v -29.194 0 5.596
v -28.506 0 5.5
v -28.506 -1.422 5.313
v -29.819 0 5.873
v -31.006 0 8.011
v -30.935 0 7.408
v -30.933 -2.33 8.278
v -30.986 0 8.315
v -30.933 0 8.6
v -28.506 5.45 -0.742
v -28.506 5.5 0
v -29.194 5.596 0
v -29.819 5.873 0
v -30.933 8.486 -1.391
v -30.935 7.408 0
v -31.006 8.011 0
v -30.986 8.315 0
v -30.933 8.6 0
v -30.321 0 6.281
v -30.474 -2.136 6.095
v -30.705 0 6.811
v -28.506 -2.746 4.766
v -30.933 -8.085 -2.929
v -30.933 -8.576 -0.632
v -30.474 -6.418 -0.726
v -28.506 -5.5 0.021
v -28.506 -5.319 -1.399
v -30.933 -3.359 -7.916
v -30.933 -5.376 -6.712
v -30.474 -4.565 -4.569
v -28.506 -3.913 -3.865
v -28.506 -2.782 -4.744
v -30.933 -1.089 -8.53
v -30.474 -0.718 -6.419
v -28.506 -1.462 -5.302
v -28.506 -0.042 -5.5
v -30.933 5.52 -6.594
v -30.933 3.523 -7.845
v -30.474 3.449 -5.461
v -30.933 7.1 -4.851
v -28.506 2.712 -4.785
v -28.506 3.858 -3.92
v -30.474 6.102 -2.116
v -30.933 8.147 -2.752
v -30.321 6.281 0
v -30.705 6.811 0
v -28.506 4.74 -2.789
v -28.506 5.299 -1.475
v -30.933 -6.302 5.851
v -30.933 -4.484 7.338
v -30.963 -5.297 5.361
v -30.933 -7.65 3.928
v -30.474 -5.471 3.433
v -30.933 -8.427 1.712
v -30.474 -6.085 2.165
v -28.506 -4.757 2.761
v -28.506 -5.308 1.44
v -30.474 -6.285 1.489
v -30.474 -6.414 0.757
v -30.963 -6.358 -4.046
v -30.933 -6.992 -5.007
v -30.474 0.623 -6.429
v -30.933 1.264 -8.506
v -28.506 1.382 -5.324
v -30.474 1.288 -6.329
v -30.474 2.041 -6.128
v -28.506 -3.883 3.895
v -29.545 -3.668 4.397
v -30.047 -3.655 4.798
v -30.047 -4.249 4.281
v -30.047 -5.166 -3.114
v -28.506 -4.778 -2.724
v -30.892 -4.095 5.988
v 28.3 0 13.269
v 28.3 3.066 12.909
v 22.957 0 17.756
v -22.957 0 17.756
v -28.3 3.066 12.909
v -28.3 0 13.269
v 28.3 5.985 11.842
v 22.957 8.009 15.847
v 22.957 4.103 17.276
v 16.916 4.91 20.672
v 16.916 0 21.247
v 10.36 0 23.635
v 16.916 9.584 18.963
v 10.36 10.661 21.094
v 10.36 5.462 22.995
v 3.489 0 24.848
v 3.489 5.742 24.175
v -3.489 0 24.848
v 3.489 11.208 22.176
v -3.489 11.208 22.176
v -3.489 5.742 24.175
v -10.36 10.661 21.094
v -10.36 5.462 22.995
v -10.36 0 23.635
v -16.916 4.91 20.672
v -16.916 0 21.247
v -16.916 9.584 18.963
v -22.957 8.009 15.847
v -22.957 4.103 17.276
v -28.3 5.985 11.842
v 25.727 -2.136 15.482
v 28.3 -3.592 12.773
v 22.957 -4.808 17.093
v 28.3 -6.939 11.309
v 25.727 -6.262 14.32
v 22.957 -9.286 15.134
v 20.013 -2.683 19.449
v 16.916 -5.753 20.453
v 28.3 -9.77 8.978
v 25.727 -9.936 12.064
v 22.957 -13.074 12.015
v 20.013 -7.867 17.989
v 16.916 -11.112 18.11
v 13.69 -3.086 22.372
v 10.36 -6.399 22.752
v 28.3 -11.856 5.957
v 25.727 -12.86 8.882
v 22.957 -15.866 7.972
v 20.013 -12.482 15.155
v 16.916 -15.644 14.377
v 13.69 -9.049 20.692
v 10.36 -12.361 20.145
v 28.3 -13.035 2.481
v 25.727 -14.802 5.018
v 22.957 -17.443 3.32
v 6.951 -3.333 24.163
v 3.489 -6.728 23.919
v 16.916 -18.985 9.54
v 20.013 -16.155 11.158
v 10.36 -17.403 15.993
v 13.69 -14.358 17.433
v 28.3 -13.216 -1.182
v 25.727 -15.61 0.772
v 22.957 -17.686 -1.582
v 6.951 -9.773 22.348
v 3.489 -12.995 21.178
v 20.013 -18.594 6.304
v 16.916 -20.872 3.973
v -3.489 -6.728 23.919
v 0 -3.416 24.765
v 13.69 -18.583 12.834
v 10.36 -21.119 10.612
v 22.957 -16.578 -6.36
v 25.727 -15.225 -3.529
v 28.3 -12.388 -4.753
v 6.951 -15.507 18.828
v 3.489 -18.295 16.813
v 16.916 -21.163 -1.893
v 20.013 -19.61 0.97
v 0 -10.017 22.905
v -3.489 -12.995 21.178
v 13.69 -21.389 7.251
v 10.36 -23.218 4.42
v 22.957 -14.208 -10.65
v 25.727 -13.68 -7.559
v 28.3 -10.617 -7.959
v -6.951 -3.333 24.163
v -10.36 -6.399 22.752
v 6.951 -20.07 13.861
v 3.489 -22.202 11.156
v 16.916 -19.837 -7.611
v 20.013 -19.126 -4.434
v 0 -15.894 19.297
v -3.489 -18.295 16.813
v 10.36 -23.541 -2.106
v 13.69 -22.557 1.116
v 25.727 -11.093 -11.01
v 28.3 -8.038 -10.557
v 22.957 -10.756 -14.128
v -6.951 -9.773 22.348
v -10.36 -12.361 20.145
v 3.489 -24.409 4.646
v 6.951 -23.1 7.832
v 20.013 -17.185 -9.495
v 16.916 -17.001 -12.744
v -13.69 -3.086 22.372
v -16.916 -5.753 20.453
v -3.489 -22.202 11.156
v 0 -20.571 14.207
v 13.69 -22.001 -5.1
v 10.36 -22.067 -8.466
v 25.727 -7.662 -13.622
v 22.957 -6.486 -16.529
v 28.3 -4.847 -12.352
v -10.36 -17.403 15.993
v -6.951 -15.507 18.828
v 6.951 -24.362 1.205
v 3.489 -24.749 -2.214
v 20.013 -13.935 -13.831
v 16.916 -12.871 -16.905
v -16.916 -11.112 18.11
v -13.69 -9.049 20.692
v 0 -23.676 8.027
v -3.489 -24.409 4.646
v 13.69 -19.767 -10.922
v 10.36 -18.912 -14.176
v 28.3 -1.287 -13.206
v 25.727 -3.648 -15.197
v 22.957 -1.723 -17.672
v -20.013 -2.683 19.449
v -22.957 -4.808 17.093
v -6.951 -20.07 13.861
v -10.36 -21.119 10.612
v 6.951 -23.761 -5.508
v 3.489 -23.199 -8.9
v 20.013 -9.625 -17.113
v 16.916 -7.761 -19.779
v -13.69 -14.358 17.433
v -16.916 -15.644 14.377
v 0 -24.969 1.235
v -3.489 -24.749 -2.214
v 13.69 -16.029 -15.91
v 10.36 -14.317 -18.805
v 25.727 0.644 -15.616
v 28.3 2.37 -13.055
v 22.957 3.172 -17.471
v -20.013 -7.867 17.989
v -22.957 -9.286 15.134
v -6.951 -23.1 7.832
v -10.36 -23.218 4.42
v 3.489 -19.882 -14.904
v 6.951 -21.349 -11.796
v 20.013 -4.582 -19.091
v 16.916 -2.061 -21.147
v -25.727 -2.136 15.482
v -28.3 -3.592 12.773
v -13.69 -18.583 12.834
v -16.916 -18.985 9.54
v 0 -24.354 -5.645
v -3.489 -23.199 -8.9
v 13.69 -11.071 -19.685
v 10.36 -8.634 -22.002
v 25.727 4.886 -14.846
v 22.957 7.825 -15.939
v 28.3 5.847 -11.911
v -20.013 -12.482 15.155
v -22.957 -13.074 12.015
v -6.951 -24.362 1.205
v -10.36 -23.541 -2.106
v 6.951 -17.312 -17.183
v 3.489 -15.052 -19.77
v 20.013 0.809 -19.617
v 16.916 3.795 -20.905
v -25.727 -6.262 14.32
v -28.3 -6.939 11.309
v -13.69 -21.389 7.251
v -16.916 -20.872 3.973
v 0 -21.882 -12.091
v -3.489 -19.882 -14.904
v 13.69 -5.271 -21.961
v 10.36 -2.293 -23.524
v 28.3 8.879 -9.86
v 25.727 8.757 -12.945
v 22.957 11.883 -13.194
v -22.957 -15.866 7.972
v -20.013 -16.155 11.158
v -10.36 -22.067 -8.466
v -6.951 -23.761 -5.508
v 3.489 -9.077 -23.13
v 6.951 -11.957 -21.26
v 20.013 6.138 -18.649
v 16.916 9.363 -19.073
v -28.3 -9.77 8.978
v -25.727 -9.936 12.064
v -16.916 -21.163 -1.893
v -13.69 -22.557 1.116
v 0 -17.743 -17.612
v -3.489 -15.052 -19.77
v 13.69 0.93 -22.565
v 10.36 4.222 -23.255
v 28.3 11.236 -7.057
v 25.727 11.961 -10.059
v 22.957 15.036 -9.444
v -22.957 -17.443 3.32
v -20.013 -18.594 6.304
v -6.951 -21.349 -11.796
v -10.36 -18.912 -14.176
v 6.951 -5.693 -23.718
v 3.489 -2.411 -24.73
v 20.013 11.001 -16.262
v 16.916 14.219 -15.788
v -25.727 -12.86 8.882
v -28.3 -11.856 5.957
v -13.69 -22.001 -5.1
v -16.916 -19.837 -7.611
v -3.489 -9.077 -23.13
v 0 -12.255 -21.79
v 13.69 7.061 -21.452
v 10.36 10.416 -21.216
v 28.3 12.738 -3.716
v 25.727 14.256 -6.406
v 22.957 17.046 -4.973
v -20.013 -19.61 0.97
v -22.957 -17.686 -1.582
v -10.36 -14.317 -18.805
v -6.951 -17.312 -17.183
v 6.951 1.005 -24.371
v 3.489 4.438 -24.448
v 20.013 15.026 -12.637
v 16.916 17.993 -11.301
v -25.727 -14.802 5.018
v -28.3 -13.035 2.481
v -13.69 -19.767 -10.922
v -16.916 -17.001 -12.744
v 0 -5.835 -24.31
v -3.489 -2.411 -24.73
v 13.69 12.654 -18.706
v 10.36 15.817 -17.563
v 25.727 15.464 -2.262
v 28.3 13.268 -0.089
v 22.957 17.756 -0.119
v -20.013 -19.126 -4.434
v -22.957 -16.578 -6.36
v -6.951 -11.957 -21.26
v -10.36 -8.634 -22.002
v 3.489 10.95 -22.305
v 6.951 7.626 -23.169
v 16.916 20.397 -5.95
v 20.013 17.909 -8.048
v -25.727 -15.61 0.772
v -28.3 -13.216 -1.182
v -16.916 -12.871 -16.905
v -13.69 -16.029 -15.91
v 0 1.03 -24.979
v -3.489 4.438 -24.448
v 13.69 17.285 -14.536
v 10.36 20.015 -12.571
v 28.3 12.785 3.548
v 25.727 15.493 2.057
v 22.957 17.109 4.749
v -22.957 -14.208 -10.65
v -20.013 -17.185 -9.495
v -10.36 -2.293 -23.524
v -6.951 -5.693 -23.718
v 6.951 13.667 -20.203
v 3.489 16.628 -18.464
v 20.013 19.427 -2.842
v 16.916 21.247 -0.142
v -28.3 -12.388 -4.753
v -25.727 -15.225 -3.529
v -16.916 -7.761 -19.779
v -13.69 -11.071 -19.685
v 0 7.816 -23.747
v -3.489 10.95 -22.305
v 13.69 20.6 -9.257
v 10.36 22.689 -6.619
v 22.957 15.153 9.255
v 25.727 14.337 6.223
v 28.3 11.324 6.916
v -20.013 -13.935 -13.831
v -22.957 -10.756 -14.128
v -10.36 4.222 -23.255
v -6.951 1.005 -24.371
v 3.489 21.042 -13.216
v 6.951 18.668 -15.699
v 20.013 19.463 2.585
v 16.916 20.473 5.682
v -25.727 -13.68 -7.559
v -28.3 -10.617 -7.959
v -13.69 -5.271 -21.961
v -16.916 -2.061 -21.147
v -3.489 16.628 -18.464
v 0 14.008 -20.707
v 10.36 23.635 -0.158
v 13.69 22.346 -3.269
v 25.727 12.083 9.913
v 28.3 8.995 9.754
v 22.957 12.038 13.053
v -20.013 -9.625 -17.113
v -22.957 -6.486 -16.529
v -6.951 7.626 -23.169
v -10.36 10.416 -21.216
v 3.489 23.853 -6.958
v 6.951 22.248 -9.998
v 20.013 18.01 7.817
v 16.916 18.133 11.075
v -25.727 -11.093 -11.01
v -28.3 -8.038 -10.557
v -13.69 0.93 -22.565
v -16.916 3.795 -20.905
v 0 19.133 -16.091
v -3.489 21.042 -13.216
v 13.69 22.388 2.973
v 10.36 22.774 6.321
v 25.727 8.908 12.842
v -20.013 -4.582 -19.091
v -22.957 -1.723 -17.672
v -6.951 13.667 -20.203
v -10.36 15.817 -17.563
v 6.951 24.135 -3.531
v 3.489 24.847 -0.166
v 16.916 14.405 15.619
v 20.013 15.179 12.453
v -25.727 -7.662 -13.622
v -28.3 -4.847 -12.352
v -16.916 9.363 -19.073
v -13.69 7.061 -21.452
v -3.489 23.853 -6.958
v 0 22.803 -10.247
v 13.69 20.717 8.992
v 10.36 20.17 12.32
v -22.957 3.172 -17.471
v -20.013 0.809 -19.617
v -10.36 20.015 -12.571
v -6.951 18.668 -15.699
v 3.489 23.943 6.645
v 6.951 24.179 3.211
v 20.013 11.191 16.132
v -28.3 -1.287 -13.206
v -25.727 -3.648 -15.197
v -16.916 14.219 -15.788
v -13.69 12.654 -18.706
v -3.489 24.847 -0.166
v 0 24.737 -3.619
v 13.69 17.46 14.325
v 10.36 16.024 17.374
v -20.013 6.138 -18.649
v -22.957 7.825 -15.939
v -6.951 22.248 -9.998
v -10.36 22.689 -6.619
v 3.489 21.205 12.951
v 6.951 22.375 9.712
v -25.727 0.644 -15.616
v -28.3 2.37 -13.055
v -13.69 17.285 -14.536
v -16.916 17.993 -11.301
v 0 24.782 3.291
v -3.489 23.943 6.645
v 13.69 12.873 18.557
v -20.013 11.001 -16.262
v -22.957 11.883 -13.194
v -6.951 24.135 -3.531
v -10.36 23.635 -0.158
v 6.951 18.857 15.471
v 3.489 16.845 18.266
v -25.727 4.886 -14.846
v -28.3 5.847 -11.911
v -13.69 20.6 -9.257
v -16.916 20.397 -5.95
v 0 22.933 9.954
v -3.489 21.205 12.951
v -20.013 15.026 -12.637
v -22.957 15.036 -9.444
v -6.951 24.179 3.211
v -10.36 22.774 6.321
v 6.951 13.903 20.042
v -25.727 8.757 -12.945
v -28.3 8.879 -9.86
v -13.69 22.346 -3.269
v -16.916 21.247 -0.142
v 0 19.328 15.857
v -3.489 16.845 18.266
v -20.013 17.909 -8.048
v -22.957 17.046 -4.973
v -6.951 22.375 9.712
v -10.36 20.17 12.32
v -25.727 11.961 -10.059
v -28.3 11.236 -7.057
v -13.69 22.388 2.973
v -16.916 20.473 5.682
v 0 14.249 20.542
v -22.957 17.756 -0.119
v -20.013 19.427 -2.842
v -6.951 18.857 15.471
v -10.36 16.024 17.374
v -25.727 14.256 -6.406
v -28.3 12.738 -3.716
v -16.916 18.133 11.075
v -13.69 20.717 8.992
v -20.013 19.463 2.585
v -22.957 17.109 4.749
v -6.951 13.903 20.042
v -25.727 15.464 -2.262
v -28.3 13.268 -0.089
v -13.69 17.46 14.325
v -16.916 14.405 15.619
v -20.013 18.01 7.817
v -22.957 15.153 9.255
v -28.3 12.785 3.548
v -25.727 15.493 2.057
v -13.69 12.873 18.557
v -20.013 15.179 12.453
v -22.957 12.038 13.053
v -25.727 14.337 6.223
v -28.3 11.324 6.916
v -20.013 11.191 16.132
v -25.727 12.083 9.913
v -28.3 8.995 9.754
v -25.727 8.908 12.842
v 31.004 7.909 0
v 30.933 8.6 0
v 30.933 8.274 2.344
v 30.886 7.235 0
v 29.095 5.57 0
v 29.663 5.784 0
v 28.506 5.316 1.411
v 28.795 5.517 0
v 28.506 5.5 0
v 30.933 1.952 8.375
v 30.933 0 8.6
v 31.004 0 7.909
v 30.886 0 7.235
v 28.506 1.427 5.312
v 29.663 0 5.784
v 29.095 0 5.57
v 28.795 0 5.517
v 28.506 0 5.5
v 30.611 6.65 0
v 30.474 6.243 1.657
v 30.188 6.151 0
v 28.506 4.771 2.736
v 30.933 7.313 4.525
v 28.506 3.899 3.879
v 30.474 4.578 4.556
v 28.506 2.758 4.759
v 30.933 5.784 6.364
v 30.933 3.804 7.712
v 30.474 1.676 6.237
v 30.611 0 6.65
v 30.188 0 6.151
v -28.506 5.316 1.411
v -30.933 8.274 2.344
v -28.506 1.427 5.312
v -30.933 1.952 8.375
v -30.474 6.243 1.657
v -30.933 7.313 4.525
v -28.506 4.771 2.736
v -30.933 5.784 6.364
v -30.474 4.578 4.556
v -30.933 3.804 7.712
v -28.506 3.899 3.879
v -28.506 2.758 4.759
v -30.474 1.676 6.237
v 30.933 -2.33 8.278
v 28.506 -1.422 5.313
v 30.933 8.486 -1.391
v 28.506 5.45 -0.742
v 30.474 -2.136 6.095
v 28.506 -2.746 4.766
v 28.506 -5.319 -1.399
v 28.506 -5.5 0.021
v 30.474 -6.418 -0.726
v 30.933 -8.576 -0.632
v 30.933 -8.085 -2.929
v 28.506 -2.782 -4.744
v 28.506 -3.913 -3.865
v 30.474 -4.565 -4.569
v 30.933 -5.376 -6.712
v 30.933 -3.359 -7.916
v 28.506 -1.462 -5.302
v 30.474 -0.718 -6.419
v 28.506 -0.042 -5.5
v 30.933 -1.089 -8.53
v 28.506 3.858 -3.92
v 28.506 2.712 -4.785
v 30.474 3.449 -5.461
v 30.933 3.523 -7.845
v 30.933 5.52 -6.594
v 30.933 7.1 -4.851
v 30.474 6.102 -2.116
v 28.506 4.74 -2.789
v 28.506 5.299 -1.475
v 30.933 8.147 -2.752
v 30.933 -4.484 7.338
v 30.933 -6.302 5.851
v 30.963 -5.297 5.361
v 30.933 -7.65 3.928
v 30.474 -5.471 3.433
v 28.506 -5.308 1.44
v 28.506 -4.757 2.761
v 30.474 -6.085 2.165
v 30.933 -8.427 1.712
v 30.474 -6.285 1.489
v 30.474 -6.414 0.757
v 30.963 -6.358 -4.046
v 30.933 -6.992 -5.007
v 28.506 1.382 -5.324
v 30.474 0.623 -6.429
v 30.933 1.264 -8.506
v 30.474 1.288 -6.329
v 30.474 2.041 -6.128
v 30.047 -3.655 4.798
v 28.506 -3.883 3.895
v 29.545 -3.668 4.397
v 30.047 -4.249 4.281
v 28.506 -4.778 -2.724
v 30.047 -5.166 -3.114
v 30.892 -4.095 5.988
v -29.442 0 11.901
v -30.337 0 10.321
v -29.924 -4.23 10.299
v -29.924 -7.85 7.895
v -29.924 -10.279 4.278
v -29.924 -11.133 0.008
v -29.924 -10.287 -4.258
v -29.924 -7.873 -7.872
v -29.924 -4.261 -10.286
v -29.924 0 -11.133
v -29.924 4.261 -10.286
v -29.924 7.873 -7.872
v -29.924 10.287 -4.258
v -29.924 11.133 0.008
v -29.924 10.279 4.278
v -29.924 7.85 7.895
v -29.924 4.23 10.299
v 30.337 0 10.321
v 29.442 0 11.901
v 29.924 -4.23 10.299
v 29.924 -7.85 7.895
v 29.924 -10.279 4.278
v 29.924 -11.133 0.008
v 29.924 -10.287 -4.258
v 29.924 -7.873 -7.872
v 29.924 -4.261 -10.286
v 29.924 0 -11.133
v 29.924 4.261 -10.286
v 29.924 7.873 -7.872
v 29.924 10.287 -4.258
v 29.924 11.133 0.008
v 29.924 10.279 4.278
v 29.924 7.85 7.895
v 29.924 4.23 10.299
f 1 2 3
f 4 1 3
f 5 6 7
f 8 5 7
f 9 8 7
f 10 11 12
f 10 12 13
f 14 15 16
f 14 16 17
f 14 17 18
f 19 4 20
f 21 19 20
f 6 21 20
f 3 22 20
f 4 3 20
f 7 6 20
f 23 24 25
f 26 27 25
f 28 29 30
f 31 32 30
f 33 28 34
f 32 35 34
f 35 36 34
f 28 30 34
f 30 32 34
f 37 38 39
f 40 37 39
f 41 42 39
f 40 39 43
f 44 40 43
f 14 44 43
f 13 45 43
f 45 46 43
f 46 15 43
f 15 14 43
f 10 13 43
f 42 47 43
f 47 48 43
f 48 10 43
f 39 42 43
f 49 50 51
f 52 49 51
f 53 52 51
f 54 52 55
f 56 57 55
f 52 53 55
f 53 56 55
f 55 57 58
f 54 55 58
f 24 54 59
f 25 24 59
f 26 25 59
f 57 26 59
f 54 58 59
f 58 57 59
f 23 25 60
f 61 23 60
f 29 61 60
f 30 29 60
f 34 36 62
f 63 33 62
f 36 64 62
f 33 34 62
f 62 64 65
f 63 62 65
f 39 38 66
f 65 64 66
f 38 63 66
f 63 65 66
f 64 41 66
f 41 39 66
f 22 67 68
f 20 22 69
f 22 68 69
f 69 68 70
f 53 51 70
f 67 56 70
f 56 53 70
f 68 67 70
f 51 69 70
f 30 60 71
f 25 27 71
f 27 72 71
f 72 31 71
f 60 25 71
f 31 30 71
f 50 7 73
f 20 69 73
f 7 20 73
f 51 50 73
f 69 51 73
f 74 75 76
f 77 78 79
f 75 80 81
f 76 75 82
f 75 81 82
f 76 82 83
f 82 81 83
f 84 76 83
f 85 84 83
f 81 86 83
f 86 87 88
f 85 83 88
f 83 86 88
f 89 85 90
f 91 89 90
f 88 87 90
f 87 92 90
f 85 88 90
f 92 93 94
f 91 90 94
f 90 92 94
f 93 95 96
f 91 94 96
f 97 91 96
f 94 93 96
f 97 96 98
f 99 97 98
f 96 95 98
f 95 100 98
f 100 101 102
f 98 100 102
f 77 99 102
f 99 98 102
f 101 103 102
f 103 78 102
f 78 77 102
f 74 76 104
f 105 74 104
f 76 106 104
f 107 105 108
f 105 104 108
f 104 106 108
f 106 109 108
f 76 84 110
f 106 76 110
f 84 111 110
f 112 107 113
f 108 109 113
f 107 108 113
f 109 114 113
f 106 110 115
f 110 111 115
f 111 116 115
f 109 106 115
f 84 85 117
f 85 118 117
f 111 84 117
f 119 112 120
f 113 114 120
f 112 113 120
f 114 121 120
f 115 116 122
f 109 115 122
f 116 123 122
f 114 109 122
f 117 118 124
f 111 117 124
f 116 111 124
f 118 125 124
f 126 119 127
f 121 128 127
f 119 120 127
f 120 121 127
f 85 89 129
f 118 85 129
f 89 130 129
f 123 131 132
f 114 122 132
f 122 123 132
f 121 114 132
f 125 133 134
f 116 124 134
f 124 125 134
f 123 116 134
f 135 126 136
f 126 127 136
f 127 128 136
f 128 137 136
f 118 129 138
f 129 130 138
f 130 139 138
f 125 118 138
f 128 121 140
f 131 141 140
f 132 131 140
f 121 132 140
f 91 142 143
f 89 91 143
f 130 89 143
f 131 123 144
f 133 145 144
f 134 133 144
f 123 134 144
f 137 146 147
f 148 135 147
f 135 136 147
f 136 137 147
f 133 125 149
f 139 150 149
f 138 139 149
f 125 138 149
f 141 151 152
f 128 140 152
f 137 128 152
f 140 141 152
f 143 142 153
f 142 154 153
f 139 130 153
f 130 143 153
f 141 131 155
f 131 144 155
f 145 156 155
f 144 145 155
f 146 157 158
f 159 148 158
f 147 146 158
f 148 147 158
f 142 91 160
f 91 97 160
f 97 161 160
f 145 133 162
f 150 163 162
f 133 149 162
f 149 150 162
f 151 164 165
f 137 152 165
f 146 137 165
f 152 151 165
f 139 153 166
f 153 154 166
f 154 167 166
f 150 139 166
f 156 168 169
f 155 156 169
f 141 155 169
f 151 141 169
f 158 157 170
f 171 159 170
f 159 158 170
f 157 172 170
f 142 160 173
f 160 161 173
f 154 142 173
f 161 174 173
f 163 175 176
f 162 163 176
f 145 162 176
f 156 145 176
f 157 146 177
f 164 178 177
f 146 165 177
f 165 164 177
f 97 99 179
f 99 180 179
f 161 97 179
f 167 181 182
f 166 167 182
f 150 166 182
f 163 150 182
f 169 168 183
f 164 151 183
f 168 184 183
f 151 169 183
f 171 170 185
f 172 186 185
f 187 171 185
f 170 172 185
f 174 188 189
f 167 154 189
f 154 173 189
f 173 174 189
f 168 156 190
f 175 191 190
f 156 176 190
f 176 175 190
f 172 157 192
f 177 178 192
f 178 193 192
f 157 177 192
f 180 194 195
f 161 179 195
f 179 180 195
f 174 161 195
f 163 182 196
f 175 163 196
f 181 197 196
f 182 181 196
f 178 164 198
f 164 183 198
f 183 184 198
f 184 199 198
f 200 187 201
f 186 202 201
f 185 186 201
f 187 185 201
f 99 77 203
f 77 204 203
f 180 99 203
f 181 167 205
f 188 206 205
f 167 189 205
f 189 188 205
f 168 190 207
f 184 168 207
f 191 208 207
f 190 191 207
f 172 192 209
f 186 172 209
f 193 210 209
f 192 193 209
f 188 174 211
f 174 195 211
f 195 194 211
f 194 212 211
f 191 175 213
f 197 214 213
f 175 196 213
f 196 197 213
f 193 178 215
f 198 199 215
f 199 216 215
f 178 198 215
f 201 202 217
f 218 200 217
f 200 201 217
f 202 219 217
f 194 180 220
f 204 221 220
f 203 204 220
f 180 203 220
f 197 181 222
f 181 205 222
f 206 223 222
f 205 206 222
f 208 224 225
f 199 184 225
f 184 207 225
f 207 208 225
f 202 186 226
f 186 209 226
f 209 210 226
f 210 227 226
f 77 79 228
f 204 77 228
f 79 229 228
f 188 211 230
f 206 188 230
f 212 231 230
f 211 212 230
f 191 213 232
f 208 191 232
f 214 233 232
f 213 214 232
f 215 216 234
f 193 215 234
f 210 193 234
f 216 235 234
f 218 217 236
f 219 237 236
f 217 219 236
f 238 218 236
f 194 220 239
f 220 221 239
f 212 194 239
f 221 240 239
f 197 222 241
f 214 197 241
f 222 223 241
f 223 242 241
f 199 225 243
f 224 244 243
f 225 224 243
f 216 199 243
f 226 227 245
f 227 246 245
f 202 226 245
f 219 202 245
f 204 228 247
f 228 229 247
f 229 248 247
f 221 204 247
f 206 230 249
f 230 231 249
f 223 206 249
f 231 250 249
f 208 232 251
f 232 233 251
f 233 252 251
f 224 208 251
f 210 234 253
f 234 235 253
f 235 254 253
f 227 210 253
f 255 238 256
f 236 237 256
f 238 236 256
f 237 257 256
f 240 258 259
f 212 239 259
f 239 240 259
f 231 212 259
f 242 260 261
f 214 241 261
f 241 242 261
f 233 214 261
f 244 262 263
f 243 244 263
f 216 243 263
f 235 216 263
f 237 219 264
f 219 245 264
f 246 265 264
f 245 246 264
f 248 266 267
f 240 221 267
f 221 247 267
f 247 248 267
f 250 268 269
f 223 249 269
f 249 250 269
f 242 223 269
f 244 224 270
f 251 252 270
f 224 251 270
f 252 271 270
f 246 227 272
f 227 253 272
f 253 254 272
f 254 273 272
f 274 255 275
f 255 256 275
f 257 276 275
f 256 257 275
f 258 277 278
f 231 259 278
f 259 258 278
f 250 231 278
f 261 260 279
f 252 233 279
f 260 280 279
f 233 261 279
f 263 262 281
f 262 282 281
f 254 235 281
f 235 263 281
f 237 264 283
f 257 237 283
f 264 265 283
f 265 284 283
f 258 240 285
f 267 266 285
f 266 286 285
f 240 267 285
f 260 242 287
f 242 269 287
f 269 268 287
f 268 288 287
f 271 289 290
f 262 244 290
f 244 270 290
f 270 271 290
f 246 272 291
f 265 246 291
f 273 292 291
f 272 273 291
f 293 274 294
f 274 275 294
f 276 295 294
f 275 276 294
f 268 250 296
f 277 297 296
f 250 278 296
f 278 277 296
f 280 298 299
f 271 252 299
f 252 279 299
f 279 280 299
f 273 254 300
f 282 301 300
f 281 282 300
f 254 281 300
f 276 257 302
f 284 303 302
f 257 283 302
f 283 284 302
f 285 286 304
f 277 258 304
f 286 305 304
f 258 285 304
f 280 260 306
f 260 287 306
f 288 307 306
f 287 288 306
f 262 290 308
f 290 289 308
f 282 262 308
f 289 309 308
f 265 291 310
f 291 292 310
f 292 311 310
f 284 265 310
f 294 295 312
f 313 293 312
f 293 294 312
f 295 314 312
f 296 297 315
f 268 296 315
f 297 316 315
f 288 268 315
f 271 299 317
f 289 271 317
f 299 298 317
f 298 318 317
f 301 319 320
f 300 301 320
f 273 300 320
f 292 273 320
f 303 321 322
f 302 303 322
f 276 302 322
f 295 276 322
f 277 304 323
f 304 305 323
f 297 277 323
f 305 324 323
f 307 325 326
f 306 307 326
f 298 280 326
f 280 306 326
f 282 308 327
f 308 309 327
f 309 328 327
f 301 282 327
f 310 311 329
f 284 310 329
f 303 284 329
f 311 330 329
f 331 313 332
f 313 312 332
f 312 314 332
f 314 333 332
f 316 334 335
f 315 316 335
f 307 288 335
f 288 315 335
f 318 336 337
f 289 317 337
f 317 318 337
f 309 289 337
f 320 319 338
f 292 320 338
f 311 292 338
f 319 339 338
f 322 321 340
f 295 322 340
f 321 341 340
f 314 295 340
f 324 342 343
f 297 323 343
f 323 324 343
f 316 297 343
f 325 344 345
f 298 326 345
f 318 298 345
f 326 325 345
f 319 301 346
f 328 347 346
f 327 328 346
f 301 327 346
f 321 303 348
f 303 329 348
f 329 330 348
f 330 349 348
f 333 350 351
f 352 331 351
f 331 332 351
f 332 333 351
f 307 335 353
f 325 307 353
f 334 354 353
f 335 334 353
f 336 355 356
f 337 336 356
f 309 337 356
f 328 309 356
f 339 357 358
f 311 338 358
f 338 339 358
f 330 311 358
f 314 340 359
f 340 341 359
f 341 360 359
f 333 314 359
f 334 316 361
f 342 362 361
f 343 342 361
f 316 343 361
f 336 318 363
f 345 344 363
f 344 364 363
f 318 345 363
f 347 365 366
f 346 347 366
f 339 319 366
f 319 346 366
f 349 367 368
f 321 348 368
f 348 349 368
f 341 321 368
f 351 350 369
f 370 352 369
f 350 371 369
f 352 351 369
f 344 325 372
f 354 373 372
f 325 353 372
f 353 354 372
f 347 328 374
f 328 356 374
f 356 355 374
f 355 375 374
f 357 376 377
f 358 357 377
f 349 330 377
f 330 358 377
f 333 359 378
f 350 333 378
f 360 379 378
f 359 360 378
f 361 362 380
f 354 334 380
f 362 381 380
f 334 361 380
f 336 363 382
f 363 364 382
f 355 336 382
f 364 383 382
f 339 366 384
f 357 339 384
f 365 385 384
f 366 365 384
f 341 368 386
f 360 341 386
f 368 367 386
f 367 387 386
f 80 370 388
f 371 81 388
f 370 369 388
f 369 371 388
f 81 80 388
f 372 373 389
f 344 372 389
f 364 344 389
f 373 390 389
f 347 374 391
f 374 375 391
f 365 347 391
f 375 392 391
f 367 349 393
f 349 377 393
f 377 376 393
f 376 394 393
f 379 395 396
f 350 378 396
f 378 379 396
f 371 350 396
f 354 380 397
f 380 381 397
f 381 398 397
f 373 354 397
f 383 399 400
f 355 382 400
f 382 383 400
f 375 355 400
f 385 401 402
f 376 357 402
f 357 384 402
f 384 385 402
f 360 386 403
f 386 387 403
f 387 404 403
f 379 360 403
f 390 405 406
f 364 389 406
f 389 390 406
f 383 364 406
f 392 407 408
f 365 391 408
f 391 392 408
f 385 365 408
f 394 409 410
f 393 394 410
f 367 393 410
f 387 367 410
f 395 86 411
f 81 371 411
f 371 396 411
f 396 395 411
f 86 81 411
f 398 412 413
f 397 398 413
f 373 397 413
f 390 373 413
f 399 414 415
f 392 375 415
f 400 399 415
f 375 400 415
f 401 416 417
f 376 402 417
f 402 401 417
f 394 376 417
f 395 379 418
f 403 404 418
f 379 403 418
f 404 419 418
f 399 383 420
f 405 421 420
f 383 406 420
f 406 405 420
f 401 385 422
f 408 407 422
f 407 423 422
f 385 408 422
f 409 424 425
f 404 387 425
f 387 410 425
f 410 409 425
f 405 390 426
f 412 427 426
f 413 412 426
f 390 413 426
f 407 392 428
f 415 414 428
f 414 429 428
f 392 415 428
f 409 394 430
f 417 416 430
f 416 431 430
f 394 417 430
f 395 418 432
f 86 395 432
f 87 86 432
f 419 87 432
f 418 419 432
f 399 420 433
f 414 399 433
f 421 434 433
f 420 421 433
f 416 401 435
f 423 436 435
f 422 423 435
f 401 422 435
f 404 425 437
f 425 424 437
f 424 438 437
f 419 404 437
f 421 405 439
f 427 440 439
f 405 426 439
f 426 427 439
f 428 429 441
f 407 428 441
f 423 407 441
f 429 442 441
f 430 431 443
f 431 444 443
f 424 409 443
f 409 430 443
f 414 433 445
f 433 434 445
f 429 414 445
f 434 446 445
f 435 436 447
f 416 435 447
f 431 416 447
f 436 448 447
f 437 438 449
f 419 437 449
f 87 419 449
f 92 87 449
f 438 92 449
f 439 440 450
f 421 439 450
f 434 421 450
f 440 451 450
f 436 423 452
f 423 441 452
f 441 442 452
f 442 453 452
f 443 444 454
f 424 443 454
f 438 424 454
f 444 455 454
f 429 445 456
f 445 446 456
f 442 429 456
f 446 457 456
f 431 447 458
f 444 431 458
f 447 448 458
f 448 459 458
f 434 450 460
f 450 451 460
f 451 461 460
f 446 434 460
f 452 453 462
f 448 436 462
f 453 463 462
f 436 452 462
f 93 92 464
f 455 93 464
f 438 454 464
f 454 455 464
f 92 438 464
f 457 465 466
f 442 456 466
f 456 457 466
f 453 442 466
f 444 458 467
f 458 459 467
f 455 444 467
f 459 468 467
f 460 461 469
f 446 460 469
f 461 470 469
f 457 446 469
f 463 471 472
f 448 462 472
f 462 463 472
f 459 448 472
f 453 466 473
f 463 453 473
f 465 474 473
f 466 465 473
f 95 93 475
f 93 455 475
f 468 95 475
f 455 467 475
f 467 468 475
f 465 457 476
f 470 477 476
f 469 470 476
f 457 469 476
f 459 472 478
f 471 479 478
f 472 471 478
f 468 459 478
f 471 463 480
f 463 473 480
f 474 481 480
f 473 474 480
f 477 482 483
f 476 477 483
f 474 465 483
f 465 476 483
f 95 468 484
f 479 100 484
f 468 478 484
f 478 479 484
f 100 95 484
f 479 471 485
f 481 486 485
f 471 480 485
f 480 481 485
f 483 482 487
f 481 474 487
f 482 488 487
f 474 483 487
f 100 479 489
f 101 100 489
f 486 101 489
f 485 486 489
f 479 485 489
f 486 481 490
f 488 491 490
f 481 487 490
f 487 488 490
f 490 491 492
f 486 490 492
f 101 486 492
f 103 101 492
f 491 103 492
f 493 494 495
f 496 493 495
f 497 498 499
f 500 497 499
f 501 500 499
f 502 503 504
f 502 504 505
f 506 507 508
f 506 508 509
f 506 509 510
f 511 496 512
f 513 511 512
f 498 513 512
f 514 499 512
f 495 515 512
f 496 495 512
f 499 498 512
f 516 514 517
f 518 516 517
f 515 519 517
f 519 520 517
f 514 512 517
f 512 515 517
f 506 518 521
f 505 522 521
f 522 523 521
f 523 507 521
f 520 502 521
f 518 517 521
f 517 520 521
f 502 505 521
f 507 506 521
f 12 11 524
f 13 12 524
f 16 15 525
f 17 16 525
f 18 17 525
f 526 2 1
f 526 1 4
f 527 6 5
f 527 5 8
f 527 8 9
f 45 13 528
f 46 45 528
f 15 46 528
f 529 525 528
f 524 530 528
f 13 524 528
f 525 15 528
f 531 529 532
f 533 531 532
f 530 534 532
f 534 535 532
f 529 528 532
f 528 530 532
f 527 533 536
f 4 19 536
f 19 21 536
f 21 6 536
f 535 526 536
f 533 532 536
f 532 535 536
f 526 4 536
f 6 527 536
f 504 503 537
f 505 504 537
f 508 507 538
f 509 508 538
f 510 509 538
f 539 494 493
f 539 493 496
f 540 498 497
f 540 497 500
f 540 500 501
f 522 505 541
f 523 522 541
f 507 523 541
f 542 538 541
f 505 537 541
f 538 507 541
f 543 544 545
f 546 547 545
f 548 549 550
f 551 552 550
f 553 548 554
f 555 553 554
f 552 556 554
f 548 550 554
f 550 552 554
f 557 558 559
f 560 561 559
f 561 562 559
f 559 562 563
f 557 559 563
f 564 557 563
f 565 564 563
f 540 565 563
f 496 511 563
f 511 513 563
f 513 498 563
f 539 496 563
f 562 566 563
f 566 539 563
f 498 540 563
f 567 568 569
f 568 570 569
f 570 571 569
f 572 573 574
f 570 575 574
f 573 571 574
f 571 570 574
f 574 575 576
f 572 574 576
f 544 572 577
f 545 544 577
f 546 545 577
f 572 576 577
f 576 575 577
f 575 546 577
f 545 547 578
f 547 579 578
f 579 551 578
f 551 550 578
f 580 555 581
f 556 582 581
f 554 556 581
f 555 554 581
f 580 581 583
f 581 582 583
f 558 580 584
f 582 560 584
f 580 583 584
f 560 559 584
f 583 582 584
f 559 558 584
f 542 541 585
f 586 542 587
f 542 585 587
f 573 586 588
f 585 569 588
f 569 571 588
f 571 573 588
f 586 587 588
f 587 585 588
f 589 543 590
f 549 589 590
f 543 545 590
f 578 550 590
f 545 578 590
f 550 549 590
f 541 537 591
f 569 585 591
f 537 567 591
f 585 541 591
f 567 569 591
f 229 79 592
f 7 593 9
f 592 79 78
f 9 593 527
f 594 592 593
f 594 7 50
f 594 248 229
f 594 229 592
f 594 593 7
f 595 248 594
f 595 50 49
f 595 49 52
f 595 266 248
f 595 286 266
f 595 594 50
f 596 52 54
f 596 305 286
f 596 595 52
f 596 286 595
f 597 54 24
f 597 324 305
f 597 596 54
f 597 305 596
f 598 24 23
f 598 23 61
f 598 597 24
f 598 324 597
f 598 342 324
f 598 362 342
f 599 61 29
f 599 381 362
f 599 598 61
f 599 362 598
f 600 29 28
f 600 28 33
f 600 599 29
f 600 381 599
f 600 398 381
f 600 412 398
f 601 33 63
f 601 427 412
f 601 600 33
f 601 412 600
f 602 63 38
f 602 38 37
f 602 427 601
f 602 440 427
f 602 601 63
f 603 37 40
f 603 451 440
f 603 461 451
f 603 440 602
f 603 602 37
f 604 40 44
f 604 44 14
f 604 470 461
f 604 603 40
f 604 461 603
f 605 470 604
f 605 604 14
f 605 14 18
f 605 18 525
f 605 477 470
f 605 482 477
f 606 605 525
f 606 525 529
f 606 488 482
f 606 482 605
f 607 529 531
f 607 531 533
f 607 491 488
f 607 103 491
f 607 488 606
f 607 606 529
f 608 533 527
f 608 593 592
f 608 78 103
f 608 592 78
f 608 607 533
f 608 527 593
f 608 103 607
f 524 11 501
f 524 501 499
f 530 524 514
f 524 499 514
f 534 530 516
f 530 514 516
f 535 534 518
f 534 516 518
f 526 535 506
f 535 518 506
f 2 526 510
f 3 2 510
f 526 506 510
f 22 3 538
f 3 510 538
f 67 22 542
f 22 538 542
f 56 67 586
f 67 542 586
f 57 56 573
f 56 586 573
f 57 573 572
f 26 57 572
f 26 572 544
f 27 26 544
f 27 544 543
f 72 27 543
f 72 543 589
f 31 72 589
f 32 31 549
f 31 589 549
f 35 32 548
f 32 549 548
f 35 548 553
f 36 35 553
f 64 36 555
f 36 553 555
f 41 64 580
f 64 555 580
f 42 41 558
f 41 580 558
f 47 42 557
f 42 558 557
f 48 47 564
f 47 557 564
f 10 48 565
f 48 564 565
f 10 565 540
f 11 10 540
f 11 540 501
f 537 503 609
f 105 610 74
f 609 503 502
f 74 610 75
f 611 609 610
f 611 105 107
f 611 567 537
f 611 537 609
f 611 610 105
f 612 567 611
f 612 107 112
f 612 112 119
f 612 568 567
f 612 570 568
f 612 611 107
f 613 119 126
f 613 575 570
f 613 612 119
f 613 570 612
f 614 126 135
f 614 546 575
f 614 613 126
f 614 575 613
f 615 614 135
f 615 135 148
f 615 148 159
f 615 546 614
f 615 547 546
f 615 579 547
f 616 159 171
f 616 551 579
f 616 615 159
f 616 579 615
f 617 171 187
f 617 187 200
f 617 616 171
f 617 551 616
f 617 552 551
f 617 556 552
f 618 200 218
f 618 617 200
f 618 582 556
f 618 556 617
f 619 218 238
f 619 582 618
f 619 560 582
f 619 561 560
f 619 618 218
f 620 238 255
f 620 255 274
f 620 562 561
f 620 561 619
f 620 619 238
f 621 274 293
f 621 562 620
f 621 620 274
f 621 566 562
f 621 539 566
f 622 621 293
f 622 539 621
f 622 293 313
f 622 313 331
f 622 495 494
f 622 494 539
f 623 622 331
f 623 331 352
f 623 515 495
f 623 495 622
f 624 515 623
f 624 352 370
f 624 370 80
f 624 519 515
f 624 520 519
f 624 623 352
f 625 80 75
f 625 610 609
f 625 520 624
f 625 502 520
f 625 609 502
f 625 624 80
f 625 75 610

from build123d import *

# Parameters (mm, degrees)
F2_R     = 10
F3_R     = 5.5
F4_DEPTH = 100
F5_R     = 2.5


with BuildPart() as f1:
    # F0 (on Front) → F1 (revolve)
    with BuildSketch(Plane.XZ):
        with BuildLine():
            Line((31.22499, 0), (31.22499, 10))
            ThreePointArc((31.22499, 10), (0, 25), (-31.22499, 10))
            Line((-31.22499, 10), (-31.22499, 0))
            Line((-31.22499, 0), (0, 0))
            Line((0, 0), (31.22499, 0))
        make_face()
    revolve(axis=Axis((-15.612495, 0, 0), (1, 0, 0)))

    # F2
    f2_edges = [f1.edges().sort_by_distance(p)[0] for p in [
        (-31.22499, 0, -10),
        (31.22499, 0, -10),
    ]]
    fillet(f2_edges, radius=F2_R)

    # F3 (on Right) → F4 (cut, symmetric)
    with BuildSketch(Plane.YZ):
        Circle(F3_R)
    extrude(amount=F4_DEPTH, both=True, mode=Mode.SUBTRACT)

    # F5
    f5_edges = [f1.edges().sort_by_distance(p)[0] for p in [
        (-31.22499, -5.5, 0),
        (0, 5.5, 0),
        (31.22499, -5.5, 0),
    ]]
    fillet(f5_edges, radius=F5_R)


solid = f1.part
